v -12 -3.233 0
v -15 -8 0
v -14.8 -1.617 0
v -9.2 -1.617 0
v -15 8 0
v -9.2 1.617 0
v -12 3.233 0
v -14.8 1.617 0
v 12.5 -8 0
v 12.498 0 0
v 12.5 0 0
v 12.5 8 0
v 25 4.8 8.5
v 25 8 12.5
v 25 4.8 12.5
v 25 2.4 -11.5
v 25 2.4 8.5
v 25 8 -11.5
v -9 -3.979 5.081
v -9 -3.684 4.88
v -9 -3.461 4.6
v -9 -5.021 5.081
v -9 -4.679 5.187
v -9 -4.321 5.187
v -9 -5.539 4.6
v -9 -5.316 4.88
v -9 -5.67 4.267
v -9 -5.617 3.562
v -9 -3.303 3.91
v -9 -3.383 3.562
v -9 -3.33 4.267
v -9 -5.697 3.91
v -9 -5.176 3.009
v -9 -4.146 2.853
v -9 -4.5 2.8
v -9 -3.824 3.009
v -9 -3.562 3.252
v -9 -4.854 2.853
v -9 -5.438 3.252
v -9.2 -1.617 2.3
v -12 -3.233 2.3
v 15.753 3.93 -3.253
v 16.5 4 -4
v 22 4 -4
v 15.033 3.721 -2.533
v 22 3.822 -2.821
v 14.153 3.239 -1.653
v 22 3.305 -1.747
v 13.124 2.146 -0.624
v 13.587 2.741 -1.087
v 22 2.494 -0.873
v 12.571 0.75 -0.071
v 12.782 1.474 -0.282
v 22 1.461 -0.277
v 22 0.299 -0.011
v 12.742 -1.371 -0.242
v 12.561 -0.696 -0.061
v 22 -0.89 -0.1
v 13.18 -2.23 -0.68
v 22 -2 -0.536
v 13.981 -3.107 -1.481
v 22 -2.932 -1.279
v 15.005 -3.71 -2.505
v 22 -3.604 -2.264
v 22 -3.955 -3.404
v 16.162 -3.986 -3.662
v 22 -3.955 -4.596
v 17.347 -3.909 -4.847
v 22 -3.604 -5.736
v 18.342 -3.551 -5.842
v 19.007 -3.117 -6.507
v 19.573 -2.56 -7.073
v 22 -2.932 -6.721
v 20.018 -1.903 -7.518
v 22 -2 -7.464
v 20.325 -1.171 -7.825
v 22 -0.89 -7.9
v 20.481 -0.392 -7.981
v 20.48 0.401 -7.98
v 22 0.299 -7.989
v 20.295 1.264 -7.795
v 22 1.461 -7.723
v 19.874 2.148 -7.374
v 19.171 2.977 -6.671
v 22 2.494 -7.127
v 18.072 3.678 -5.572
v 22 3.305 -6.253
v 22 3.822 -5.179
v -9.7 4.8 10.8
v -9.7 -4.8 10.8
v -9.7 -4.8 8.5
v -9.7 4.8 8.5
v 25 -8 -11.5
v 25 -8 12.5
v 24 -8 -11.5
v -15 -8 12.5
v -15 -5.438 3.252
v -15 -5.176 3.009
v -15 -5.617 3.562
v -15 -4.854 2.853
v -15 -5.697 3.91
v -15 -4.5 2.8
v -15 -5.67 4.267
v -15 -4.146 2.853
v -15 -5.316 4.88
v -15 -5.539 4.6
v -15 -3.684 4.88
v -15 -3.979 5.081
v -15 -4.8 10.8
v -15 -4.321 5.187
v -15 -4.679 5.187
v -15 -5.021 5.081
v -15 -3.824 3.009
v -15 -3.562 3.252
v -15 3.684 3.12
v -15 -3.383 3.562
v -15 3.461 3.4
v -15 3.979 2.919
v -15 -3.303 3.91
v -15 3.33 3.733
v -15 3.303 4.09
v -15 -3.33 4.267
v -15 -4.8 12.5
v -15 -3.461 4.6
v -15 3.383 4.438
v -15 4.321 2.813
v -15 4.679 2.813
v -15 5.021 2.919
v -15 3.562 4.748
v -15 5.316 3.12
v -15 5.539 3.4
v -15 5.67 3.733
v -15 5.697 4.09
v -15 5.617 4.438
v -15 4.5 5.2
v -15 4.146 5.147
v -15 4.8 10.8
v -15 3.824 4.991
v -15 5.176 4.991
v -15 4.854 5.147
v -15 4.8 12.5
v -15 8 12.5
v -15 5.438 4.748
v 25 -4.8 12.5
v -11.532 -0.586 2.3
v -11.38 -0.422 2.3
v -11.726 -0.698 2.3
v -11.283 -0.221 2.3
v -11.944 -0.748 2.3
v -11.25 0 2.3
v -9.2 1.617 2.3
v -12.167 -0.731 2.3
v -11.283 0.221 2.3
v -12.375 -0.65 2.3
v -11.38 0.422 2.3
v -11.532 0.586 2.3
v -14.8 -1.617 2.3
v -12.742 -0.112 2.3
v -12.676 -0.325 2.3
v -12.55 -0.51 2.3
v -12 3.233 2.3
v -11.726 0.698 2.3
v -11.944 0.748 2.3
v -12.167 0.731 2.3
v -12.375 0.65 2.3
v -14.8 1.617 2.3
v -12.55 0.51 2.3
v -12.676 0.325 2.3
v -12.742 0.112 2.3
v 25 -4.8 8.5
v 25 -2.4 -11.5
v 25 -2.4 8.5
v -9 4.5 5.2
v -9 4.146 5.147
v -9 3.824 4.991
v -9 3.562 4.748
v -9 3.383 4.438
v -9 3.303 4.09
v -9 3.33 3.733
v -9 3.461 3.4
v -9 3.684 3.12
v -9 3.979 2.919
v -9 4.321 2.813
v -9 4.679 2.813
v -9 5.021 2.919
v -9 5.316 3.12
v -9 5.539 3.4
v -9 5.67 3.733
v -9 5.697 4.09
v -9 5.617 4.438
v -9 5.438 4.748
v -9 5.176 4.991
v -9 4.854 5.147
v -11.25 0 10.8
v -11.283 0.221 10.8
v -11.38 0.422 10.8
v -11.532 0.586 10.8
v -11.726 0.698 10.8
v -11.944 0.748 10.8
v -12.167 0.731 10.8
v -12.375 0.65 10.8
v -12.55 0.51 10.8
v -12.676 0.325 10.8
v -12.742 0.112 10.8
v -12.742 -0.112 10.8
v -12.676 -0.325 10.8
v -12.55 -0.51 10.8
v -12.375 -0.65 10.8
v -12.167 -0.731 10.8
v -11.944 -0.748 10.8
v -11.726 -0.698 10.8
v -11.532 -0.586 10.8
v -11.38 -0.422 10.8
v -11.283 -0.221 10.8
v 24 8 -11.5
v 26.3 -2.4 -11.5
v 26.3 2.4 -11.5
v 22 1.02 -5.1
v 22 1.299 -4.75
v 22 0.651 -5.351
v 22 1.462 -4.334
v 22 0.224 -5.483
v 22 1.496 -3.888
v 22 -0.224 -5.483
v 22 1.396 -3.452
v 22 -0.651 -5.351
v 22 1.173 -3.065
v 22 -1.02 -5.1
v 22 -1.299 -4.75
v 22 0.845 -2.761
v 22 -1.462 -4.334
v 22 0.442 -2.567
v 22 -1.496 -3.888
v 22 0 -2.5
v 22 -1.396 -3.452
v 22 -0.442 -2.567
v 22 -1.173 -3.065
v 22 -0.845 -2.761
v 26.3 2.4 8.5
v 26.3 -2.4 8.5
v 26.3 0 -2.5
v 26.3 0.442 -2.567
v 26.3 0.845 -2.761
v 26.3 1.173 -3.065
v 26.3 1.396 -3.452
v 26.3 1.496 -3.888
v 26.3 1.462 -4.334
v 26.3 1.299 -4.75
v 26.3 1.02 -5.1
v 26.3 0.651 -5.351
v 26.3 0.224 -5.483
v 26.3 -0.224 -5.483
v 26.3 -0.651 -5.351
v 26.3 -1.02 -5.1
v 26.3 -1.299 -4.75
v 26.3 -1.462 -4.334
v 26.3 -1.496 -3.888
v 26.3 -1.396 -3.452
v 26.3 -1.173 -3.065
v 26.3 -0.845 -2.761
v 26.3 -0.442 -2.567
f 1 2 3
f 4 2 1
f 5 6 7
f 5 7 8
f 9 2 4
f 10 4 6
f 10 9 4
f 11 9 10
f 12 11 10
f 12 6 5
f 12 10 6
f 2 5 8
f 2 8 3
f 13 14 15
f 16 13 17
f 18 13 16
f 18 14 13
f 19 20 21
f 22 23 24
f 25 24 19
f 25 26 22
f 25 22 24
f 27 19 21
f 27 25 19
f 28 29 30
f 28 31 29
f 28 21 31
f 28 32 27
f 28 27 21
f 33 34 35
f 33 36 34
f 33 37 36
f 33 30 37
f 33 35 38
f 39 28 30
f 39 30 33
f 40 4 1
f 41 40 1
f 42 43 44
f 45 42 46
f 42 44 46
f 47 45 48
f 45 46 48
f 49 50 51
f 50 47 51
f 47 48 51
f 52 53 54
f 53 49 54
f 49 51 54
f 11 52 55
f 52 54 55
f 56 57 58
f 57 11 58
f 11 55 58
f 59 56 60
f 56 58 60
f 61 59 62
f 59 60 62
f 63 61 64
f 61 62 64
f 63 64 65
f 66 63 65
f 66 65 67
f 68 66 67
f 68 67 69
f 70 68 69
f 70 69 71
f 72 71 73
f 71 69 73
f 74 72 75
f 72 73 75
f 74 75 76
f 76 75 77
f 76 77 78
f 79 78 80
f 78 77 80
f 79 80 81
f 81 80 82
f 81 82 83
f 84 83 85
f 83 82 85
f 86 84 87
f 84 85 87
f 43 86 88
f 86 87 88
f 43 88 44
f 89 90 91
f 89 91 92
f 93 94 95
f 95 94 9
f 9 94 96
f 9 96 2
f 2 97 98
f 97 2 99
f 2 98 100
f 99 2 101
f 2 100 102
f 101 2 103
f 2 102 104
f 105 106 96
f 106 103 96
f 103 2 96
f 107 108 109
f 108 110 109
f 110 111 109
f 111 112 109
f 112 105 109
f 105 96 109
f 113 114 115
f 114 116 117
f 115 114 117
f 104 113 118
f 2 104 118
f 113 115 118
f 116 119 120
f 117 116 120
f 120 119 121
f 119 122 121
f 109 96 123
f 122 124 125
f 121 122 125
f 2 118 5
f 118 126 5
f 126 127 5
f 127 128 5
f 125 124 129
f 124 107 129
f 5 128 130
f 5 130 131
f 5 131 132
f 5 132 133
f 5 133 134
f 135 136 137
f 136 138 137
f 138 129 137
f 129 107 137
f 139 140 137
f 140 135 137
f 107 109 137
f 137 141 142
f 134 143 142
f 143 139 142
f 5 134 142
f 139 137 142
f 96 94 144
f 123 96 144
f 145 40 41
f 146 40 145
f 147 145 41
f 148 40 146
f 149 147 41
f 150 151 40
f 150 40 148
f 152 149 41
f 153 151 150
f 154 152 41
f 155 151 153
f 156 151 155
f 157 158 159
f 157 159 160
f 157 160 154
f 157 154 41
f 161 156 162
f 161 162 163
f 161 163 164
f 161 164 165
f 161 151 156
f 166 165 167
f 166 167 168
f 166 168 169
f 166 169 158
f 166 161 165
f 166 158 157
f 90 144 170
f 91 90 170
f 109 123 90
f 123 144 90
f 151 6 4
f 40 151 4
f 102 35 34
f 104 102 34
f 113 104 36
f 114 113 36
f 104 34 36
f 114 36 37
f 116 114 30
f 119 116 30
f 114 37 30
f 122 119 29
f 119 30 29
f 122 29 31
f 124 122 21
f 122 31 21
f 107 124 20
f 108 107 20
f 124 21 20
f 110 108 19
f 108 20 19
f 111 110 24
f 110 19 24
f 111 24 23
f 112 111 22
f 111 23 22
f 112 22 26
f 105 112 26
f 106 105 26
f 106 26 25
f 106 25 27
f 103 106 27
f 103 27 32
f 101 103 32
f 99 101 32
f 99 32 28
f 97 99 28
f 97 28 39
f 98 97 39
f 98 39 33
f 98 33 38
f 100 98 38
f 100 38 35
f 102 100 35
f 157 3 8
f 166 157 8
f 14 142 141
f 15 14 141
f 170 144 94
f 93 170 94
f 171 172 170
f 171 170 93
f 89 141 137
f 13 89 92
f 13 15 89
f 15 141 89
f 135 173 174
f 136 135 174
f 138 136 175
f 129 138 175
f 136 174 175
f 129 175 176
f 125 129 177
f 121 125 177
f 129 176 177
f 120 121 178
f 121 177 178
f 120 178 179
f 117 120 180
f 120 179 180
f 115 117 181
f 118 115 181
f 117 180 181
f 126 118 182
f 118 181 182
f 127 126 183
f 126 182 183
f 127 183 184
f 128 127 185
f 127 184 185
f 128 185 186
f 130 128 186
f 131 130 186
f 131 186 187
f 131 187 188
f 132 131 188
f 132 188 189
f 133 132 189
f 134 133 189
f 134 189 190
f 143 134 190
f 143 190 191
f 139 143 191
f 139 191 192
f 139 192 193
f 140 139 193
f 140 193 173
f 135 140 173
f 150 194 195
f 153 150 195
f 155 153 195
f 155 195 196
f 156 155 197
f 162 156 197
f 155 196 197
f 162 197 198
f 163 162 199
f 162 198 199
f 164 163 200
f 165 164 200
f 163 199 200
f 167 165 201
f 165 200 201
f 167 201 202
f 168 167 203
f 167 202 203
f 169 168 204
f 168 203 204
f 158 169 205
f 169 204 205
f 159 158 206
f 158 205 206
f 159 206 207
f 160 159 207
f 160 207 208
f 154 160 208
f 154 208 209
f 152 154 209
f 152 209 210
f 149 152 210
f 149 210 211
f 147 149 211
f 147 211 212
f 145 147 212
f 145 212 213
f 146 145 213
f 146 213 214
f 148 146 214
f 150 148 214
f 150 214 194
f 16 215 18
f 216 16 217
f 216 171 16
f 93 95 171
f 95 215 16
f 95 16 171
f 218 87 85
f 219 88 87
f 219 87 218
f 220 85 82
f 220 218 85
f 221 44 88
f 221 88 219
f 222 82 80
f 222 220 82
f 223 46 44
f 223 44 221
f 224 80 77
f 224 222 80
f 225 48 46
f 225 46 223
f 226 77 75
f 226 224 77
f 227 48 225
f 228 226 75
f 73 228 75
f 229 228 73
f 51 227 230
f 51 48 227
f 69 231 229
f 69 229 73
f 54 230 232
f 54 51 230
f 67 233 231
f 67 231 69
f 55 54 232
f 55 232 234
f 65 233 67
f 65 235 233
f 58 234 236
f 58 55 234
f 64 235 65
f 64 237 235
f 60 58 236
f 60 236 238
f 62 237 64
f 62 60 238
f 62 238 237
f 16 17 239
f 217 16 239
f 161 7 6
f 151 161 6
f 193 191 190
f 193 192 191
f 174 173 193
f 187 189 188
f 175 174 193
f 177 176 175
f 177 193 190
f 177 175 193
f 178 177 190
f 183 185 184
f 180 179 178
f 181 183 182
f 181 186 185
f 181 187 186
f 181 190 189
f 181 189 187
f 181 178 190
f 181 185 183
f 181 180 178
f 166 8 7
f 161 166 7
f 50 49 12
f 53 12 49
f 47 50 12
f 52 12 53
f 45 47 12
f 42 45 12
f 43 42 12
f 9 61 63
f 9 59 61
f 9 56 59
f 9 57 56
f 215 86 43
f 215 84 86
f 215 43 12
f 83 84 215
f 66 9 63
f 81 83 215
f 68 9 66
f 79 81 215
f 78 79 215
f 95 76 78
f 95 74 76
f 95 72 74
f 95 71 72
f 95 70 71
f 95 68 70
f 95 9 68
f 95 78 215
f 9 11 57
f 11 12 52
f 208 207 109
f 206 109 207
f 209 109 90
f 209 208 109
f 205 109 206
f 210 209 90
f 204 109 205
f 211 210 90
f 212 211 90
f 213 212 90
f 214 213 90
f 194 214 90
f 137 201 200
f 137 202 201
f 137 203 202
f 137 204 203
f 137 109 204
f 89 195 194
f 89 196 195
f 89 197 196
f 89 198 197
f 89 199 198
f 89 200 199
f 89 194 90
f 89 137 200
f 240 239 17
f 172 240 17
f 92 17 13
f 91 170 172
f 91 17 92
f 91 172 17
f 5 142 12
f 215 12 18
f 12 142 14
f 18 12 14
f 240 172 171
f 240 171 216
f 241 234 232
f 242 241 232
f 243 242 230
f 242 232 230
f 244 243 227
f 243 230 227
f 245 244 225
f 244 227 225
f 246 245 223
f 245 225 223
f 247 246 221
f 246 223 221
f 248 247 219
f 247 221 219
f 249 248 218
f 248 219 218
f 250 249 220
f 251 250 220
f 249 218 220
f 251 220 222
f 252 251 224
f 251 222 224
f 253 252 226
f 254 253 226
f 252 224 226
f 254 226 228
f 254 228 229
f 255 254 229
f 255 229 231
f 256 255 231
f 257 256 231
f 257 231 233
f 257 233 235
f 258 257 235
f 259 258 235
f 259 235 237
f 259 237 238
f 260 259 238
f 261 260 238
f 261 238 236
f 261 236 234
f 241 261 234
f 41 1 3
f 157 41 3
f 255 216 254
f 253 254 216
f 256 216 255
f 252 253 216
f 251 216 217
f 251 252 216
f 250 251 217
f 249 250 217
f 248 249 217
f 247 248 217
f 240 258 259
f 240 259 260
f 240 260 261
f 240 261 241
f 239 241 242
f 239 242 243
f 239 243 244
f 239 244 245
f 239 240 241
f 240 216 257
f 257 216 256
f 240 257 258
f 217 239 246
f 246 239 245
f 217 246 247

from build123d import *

# Parameters (mm, degrees)
BOSS_EXTRU_1_DEPTH                             = 15
ESQUISSE2_R                                    = 1.2
ENL_V_MAT_EXTRU_1_DEPTH                        = 26.243811123
ESQUISSE3_R                                    = 0.75
ENL_V_MAT_EXTRU_2_DEPTH                        = 20.006577809
ESQUISSE4_R                                    = 1.2
ENL_V_MAT_EXTRU_3_DEPTH                        = 34.470135942
BOSS_EXTRU_2_START                             = 2.3
ESQUISSE5_W                                    = 5.3
ESQUISSE5_H                                    = 9.6
ESQUISSE5_R                                    = 0.75
BOSS_EXTRU_2_DEPTH                             = 2.3
FRAISAGE_POUR_VIS_T_TE_FRAIS_E_M31_D           = 3.2
FRAISAGE_POUR_VIS_T_TE_FRAIS_E_M31_CSINK_D     = 6.3
FRAISAGE_POUR_VIS_T_TE_FRAIS_E_M31_CSINK_ANGLE = 90
ENL_V_MAT_EXTRU_4_DEPTH                        = 2.3
ESQUISSE9_R                                    = 1.2
ENL_V_MAT_EXTRU_5_DEPTH                        = 20.006577853
BOSS_EXTRU_3_DEPTH                             = 16
ESQUISSE11_W                                   = 4
ESQUISSE11_H                                   = 3.2
BOSS_EXTRU_4_DEPTH                             = 10
ESQUISSE14_W                                   = 1.3
ESQUISSE14_H                                   = 4.8
BOSS_EXTRU_5_DEPTH                             = 20
ENL_V_MAT_EXTRU_6_OUTLINE_W                    = 4
ENL_V_MAT_EXTRU_6_OUTLINE_H                    = 9.502069599
ESQUISSE13_R                                   = 1.5
ENL_V_MAT_EXTRU_7_DEPTH                        = 40.865398531


with BuildPart() as part:
    # Esquisse1 → Boss.-Extru.1 (new, symmetric)
    with BuildSketch(Plane(origin=(0, 0, 0), x_dir=(0, 0, -1), z_dir=(1, 0, 0))):
        Polygon((-12.5, -4.8), (-12.5, -8), (0, -8), (0, 8), (-12.5, 8), (-12.5, 4.8), (-8.5, 4.8), (-8.5, -4.8), align=None)
    extrude(amount=BOSS_EXTRU_1_DEPTH, both=True)

    # Esquisse2 → Enlèv. mat.-Extru.1 (cut, through all)
    with BuildSketch(Plane(origin=(0, 8, 0), x_dir=(1, 0, 0), z_dir=(0, 1, 0))):
        with Locations(Location((-7.5, -4, 0), (0, 0, 270))):
            Circle(ESQUISSE2_R)
        with Locations(Location((7.5, -4, 0), (0, 0, 90))):
            Circle(ESQUISSE2_R)
        with Locations(Location((0, -4, 0), (0, 0, 270))):
            Circle(ESQUISSE2_R)
    extrude(amount=-ENL_V_MAT_EXTRU_1_DEPTH, mode=Mode.SUBTRACT)

    # Esquisse3 → Enlèv. mat.-Extru.2 (cut, through all)
    with BuildSketch(Plane.XY.offset(8.5)):
        with Locations((-12, 0)):
            Circle(ESQUISSE3_R)
    extrude(amount=-ENL_V_MAT_EXTRU_2_DEPTH, mode=Mode.SUBTRACT)

    # Esquisse4 → Enlèv. mat.-Extru.3 (cut, through all)
    with BuildSketch(Plane(origin=(15, 0, 0), x_dir=(0, 0, -1), z_dir=(1, 0, 0))):
        with Locations((-4, -4.5)):
            Circle(ESQUISSE4_R)
        with Locations(Location((-4, 4.5, 0), (0, 0, 180))):
            Circle(ESQUISSE4_R)
    extrude(amount=-ENL_V_MAT_EXTRU_3_DEPTH, mode=Mode.SUBTRACT)

    # Esquisse5 → Boss.-Extru.2 (add)
    with BuildSketch(Plane.XY.offset(8.5).offset(BOSS_EXTRU_2_START)):
        with Locations((-12.35, 0)):
            Rectangle(ESQUISSE5_W, ESQUISSE5_H)
        with Locations((-12, 0)):
            Circle(ESQUISSE5_R, mode=Mode.SUBTRACT)
    extrude(amount=-BOSS_EXTRU_2_DEPTH)

    # Fraisage pour vis à tête fraisée M31 (through all)
    with Locations(Plane.XY.offset(8.5)):
        with Locations((0, 0)):
            CounterSinkHole(FRAISAGE_POUR_VIS_T_TE_FRAIS_E_M31_D / 2, FRAISAGE_POUR_VIS_T_TE_FRAIS_E_M31_CSINK_D / 2, counter_sink_angle=FRAISAGE_POUR_VIS_T_TE_FRAIS_E_M31_CSINK_ANGLE)

    # Esquisse8 → Enlèv. mat.-Extru.4 (cut)
    with BuildSketch(Plane(origin=(0, 0, 0), x_dir=(-1, 0, 0), z_dir=(0, 0, -1))):
        Polygon((14.8, 1.616580754), (12, 3.233161507), (9.2, 1.616580754), (9.2, -1.616580754), (12, -3.233161507), (14.8, -1.616580754), align=None)
    extrude(amount=-ENL_V_MAT_EXTRU_4_DEPTH, mode=Mode.SUBTRACT)

    # Esquisse9 → Enlèv. mat.-Extru.5 (cut, through all)
    with BuildSketch(Plane.XY.offset(8.5)):
        with Locations((5, 0)):
            Circle(ESQUISSE9_R)
    extrude(amount=-ENL_V_MAT_EXTRU_5_DEPTH, mode=Mode.SUBTRACT)

    # Esquisse10 → Boss.-Extru.3 (add)
    with BuildSketch(Plane.XZ.offset(8)):
        Polygon((25, 8.5), (-9, 8.5), (-9, 0), (12.5, 0), (24, -11.5), (25, -11.5), align=None)
    extrude(amount=-BOSS_EXTRU_3_DEPTH)

    # Esquisse11 → Boss.-Extru.4 (add)
    with BuildSketch(Plane(origin=(15, 0, 0), x_dir=(0, 0, -1), z_dir=(1, 0, 0))):
        with Locations((-10.5, -6.4)):
            Rectangle(ESQUISSE11_W, ESQUISSE11_H)
        with Locations((-10.5, 6.4)):
            Rectangle(ESQUISSE11_W, ESQUISSE11_H)
    extrude(amount=BOSS_EXTRU_4_DEPTH)

    # Esquisse14 → Boss.-Extru.5 (add)
    with BuildSketch(Plane.XY.offset(8.5)):
        with Locations((25.65, 0)):
            Rectangle(ESQUISSE14_W, ESQUISSE14_H)
    extrude(amount=-BOSS_EXTRU_5_DEPTH)

    # Enlèv. mat.-Extru.6: read off the stored shape, not the designer's step
    # Enlèv. mat.-Extru.6 outline → Enlèv. mat.-Extru.6 (revolve, cut)
    with BuildSketch(Plane.YX.offset(4)):
        with Locations((2, 17.248965201)):
            Rectangle(ENL_V_MAT_EXTRU_6_OUTLINE_W, ENL_V_MAT_EXTRU_6_OUTLINE_H)
    revolve(axis=Axis((0, 0, -4), (1, 0, 0)), mode=Mode.SUBTRACT)

    # Esquisse13 → Enlèv. mat.-Extru.7 (cut, through all)
    with BuildSketch(Plane.ZY.offset(-22)):
        with Locations((-4, 0)):
            Circle(ESQUISSE13_R)
    extrude(amount=-ENL_V_MAT_EXTRU_7_DEPTH, mode=Mode.SUBTRACT)


solid = part.part
